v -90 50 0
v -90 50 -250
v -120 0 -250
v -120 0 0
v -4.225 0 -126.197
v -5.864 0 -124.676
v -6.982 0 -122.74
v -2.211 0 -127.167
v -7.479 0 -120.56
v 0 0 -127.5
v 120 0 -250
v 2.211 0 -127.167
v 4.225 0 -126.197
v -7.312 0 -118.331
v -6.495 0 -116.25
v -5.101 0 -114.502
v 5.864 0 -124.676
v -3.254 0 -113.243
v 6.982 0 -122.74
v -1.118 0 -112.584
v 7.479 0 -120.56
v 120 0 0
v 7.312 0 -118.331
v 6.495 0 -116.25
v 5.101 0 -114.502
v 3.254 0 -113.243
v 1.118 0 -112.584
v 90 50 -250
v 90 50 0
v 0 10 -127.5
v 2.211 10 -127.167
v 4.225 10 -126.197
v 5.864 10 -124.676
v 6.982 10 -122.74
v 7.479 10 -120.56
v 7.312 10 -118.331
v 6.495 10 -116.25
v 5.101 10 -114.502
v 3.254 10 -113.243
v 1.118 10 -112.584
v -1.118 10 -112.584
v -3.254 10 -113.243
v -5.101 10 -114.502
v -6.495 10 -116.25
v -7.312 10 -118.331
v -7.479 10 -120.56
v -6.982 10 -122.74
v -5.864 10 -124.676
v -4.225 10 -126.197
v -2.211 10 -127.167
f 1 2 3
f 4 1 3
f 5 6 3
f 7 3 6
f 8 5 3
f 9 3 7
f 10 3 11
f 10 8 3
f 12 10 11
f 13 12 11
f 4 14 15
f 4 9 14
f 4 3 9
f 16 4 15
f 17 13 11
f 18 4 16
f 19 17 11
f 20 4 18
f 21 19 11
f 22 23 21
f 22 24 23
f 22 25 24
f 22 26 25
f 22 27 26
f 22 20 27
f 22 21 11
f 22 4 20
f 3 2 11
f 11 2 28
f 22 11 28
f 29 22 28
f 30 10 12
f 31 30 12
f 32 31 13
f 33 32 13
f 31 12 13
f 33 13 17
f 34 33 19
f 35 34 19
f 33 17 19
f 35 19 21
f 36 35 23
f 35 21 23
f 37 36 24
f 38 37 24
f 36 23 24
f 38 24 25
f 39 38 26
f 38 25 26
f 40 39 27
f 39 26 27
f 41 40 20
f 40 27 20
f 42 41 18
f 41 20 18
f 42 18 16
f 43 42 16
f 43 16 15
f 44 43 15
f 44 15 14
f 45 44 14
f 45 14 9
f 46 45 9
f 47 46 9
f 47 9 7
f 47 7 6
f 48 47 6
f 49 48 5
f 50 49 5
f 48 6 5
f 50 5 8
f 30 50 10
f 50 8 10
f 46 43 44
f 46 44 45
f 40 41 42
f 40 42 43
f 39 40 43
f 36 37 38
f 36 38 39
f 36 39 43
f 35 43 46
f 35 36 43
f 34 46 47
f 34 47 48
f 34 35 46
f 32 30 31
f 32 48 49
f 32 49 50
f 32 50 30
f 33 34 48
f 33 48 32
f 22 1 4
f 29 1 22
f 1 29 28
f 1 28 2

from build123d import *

# Parameters (mm, degrees)
BOSS_EXTRUDE1_DEPTH = 250
SKETCH2_R           = 7.5
CUT_EXTRUDE1_DEPTH  = 10


with BuildPart() as part:
    # Sketch1 → Boss-Extrude1 (new body)
    with BuildSketch(Plane.XY):
        Polygon((-120, 0), (120, 0), (90, 50), (-90, 50), align=None)
    extrude(amount=-BOSS_EXTRUDE1_DEPTH)

    # Sketch2 → Cut-Extrude1 (cut)
    with BuildSketch(Plane.XZ):
        with Locations(Location((0, -120, 0), (0, 0, 270))):
            Circle(SKETCH2_R)
    extrude(amount=-CUT_EXTRUDE1_DEPTH, mode=Mode.SUBTRACT)


solid = part.part
